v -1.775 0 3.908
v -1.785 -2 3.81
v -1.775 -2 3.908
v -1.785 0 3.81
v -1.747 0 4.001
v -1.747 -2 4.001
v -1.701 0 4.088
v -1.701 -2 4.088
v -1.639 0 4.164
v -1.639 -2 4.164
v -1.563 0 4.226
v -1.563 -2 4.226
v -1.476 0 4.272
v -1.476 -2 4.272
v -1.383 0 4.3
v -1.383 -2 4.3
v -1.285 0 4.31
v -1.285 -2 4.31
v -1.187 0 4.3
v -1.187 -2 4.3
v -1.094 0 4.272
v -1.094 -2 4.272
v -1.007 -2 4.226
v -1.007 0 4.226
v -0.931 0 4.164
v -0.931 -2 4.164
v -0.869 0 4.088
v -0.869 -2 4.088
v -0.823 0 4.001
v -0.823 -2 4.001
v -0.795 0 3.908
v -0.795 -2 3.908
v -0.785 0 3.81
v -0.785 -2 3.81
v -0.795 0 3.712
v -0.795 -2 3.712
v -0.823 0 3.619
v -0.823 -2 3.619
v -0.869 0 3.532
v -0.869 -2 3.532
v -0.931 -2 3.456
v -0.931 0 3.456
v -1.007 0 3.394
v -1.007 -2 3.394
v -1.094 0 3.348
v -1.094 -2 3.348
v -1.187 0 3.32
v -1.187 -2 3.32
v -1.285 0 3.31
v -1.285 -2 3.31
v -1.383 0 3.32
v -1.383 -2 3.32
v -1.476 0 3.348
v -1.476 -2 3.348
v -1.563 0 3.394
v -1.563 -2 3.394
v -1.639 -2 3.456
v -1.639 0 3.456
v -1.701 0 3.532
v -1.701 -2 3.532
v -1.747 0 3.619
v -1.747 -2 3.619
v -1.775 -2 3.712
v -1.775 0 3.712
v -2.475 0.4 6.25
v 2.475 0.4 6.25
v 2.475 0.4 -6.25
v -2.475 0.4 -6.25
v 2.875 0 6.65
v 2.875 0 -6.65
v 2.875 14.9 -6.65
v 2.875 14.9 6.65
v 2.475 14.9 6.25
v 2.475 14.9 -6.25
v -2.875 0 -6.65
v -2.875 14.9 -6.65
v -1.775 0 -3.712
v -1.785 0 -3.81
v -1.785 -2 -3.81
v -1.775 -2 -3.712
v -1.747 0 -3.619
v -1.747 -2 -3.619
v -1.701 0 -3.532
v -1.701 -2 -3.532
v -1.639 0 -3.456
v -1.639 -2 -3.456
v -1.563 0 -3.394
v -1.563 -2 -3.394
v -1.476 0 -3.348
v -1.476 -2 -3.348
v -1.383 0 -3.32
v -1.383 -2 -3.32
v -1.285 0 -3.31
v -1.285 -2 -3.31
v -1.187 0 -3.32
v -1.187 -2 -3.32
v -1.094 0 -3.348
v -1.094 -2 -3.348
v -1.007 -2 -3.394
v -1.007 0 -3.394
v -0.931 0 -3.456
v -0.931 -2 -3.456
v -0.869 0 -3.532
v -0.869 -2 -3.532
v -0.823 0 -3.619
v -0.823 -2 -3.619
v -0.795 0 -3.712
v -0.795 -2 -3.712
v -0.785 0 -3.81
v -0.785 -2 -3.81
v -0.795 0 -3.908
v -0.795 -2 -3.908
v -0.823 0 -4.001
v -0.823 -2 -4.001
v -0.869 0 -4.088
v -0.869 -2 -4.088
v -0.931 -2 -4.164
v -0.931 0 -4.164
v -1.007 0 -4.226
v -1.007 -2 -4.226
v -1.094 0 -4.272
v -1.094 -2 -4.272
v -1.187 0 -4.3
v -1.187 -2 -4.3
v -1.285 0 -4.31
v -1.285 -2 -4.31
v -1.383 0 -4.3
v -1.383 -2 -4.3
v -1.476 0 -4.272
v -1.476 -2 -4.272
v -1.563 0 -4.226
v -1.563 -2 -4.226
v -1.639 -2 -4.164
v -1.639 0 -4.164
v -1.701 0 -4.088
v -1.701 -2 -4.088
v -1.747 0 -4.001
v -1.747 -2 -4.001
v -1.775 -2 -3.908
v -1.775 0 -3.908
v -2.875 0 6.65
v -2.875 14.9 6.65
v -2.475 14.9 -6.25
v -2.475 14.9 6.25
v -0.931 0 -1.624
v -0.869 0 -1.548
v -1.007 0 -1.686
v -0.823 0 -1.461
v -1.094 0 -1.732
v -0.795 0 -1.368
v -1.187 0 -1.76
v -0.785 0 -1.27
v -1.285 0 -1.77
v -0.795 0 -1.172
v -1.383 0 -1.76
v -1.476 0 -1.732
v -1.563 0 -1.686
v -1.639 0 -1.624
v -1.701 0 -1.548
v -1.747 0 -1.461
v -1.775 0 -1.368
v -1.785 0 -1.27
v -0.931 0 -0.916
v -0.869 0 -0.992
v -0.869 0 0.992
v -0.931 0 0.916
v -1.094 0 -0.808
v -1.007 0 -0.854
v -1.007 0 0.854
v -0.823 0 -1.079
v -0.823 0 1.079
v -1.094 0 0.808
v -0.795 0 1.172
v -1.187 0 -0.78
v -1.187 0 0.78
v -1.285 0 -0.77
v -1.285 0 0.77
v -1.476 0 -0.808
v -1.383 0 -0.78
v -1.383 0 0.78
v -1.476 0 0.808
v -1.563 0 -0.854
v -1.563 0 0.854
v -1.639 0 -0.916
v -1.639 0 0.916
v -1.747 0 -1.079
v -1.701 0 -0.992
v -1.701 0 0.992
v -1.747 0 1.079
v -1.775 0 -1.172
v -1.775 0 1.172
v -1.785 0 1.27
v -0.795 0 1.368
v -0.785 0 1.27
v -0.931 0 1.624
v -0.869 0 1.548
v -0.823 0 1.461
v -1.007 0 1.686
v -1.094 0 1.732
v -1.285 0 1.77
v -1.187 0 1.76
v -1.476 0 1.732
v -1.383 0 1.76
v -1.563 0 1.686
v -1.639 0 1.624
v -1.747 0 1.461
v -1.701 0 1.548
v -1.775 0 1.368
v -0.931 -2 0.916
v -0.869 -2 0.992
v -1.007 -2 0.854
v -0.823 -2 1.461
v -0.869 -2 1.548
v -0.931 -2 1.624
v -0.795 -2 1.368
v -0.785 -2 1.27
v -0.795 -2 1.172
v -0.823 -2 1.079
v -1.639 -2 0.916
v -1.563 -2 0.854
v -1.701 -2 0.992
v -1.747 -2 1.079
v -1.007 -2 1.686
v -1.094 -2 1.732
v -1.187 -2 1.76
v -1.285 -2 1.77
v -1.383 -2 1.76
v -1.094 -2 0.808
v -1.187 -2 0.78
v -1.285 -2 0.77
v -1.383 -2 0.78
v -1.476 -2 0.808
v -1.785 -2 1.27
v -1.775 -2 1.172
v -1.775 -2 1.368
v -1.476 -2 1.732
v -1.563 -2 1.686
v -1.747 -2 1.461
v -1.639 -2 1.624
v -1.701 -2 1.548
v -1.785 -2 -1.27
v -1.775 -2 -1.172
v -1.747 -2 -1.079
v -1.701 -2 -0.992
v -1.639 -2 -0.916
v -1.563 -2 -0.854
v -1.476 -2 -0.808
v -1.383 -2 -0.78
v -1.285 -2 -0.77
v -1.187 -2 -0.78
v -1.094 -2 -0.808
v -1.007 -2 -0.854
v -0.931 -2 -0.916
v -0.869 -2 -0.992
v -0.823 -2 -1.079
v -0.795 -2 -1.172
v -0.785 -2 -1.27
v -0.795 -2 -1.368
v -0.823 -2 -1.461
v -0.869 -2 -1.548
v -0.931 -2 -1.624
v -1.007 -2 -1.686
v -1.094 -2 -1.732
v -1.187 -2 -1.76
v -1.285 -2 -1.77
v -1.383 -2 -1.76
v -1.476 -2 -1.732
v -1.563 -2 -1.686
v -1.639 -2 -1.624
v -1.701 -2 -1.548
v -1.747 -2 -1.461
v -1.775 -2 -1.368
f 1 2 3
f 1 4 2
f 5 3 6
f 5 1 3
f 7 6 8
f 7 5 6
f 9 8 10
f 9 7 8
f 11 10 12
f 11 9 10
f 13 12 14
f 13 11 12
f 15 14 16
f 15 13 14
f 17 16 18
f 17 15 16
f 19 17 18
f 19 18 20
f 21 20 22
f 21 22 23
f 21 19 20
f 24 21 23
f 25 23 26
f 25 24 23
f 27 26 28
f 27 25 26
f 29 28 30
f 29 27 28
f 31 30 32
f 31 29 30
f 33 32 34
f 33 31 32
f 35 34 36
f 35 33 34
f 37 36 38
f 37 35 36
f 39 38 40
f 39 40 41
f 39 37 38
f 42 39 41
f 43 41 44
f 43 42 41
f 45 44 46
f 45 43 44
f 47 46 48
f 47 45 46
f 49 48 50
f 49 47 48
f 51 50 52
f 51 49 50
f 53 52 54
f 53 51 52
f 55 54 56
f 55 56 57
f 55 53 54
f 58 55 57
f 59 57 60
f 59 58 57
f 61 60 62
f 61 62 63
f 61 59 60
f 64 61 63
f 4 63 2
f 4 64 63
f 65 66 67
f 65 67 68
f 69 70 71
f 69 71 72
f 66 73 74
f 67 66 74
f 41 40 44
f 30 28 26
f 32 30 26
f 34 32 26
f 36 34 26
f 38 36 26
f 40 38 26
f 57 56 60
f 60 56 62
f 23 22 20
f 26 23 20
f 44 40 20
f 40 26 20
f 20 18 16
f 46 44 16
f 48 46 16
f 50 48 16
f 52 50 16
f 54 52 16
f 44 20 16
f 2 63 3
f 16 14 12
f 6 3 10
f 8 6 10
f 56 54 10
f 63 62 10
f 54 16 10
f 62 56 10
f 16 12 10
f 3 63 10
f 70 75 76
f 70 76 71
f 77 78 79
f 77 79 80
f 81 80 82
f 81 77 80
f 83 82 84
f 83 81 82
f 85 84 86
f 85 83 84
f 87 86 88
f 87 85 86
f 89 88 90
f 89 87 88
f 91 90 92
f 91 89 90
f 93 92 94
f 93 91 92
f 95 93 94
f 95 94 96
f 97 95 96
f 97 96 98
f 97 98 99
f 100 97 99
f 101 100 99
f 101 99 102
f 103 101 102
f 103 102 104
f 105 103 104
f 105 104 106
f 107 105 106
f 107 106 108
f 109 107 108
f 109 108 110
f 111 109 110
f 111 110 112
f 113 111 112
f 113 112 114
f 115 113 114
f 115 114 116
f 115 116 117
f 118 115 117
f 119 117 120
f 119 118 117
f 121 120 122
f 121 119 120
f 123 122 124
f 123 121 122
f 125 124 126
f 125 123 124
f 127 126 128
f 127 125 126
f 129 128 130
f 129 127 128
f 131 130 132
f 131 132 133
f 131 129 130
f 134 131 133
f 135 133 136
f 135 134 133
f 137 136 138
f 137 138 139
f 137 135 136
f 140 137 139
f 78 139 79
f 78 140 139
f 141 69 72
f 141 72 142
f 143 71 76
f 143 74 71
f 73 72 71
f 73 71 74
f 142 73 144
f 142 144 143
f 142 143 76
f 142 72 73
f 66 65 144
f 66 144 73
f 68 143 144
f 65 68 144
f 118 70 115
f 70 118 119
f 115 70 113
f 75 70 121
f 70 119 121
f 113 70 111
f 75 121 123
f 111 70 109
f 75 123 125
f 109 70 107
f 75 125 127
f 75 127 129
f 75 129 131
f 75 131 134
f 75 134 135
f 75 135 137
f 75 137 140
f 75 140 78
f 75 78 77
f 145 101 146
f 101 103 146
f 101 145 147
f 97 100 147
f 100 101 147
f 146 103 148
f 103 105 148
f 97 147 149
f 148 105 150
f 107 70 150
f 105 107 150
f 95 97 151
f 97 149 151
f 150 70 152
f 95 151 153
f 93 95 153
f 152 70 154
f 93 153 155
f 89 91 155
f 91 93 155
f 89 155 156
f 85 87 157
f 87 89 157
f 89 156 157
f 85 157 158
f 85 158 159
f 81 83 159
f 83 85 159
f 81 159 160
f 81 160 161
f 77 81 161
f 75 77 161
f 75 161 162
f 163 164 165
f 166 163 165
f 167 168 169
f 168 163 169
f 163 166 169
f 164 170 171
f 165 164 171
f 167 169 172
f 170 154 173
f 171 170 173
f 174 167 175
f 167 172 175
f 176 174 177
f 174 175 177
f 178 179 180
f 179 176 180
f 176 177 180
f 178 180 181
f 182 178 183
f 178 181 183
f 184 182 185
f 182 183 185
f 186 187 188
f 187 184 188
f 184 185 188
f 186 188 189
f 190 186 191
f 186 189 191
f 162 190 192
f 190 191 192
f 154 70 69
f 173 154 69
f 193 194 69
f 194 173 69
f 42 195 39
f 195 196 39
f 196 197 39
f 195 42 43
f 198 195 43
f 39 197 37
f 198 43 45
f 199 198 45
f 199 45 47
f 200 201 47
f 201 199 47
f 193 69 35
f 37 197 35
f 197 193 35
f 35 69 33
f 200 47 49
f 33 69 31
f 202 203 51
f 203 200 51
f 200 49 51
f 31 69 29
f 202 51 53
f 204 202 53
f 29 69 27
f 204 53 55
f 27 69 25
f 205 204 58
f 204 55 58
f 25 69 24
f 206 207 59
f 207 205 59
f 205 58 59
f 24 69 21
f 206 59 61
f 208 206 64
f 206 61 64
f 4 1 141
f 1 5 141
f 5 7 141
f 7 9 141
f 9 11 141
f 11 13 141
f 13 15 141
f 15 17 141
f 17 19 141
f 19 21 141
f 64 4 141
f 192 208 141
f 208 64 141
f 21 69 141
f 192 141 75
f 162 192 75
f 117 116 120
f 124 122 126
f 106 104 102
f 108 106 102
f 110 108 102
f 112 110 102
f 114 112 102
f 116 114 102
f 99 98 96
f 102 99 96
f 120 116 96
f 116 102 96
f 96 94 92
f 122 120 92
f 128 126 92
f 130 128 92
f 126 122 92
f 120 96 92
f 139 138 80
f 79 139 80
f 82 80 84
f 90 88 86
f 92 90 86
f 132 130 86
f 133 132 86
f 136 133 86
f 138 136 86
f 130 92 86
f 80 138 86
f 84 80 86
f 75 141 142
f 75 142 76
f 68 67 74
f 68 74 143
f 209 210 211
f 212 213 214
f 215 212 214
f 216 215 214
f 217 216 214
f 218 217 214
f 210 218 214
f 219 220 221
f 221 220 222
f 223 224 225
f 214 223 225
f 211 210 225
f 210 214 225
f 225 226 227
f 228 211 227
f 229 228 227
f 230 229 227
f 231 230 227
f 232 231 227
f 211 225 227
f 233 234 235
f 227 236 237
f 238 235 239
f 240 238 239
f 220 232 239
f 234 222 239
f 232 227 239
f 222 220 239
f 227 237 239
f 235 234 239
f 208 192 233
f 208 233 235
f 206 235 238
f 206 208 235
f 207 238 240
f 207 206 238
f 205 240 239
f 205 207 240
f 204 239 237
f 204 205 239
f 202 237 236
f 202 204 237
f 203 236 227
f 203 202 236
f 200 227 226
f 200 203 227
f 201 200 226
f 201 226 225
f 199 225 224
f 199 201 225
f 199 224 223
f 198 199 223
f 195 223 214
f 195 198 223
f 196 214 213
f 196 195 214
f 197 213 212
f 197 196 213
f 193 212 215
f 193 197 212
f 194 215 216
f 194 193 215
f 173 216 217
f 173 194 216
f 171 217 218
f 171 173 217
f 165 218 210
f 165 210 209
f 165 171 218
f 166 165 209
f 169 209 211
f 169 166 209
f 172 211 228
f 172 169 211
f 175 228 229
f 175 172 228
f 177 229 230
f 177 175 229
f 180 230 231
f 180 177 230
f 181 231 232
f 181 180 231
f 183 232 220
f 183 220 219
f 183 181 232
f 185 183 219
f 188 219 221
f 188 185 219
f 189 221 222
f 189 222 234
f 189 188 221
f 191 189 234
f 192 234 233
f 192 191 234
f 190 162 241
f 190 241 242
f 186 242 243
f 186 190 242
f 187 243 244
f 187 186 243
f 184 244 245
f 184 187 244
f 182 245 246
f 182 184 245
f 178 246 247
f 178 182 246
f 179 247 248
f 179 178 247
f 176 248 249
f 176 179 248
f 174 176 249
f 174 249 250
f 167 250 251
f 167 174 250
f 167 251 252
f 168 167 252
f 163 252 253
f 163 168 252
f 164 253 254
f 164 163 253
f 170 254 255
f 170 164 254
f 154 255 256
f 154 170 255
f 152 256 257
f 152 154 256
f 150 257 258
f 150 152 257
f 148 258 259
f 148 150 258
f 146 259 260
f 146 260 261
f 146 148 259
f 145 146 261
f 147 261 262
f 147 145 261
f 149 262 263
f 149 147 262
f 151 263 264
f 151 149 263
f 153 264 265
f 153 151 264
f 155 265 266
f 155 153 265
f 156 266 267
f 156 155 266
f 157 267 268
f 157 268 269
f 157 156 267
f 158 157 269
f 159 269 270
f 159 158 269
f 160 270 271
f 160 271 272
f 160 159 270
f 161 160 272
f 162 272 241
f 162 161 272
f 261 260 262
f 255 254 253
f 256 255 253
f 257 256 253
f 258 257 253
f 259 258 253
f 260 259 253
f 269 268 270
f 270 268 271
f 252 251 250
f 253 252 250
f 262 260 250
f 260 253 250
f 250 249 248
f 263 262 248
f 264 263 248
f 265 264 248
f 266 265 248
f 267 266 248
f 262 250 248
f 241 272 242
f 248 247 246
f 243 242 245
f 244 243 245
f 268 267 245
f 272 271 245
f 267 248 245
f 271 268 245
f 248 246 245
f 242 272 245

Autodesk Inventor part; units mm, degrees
ref_plane "YZ Plane" through (0, 0, 0) normal (1, 0, 0) x (0, 1, 0)
ref_plane "XZ Plane" through (0, 0, 0) normal (0, 1, 0) x (-1, 0, 0)
ref_plane "XY Plane" through (0, 0, 0) normal (0, 0, 1) x (1, 0, 0)
sketch "Sketch1" plane through (0, 0, 0) normal (0, 1, 0) x (-1, 0, 0)
  line L0 (-2.875, 6.65) -> (2.875, 6.65)
  line L1 (2.875, 6.65) -> (2.875, -6.65)
  line L2 (2.875, -6.65) -> (-2.875, -6.65)
  line L3 (-2.875, -6.65) -> (-2.875, 6.65)
  line L4 (-2.875, 6.65) -> (2.875, -6.65) construction
  line L5 (2.875, 6.65) -> (-2.875, -6.65) construction
  line L6 (2.475, -6.25) -> (2.475, 6.25)
  line L7 (2.475, 6.25) -> (-2.475, 6.25)
  line L8 (-2.475, 6.25) -> (-2.475, -6.25)
  line L9 (-2.475, -6.25) -> (2.475, -6.25)
  circle A0 centre (1.285, 3.81) radius 0.5
  point P0 (0, 0)
  dimension "d0" = 13.3
  dimension "d1" = 5.75
  dimension "d2" = 0.4
  dimension "d7" = 1
  dimension "d8" = 4.16
  dimension "d9" = 3.81
extrude "Extrusion1" add sketch "Sketch1" along normal blind 14.9 contours L0 L1 L2 L3
extrude "Extrusion2" add sketch "Sketch1" along normal blind 0.4 contours L9 L8 L7 L6 | A0
extrude "Extrusion3" add sketch "Sketch1" against normal blind 2 contours A0
pattern_linear "Rectangular Pattern1" count 4 spacing 2.54 along (0, 0, -1) of "Extrusion3"
properties part number "Female USB SMT"
